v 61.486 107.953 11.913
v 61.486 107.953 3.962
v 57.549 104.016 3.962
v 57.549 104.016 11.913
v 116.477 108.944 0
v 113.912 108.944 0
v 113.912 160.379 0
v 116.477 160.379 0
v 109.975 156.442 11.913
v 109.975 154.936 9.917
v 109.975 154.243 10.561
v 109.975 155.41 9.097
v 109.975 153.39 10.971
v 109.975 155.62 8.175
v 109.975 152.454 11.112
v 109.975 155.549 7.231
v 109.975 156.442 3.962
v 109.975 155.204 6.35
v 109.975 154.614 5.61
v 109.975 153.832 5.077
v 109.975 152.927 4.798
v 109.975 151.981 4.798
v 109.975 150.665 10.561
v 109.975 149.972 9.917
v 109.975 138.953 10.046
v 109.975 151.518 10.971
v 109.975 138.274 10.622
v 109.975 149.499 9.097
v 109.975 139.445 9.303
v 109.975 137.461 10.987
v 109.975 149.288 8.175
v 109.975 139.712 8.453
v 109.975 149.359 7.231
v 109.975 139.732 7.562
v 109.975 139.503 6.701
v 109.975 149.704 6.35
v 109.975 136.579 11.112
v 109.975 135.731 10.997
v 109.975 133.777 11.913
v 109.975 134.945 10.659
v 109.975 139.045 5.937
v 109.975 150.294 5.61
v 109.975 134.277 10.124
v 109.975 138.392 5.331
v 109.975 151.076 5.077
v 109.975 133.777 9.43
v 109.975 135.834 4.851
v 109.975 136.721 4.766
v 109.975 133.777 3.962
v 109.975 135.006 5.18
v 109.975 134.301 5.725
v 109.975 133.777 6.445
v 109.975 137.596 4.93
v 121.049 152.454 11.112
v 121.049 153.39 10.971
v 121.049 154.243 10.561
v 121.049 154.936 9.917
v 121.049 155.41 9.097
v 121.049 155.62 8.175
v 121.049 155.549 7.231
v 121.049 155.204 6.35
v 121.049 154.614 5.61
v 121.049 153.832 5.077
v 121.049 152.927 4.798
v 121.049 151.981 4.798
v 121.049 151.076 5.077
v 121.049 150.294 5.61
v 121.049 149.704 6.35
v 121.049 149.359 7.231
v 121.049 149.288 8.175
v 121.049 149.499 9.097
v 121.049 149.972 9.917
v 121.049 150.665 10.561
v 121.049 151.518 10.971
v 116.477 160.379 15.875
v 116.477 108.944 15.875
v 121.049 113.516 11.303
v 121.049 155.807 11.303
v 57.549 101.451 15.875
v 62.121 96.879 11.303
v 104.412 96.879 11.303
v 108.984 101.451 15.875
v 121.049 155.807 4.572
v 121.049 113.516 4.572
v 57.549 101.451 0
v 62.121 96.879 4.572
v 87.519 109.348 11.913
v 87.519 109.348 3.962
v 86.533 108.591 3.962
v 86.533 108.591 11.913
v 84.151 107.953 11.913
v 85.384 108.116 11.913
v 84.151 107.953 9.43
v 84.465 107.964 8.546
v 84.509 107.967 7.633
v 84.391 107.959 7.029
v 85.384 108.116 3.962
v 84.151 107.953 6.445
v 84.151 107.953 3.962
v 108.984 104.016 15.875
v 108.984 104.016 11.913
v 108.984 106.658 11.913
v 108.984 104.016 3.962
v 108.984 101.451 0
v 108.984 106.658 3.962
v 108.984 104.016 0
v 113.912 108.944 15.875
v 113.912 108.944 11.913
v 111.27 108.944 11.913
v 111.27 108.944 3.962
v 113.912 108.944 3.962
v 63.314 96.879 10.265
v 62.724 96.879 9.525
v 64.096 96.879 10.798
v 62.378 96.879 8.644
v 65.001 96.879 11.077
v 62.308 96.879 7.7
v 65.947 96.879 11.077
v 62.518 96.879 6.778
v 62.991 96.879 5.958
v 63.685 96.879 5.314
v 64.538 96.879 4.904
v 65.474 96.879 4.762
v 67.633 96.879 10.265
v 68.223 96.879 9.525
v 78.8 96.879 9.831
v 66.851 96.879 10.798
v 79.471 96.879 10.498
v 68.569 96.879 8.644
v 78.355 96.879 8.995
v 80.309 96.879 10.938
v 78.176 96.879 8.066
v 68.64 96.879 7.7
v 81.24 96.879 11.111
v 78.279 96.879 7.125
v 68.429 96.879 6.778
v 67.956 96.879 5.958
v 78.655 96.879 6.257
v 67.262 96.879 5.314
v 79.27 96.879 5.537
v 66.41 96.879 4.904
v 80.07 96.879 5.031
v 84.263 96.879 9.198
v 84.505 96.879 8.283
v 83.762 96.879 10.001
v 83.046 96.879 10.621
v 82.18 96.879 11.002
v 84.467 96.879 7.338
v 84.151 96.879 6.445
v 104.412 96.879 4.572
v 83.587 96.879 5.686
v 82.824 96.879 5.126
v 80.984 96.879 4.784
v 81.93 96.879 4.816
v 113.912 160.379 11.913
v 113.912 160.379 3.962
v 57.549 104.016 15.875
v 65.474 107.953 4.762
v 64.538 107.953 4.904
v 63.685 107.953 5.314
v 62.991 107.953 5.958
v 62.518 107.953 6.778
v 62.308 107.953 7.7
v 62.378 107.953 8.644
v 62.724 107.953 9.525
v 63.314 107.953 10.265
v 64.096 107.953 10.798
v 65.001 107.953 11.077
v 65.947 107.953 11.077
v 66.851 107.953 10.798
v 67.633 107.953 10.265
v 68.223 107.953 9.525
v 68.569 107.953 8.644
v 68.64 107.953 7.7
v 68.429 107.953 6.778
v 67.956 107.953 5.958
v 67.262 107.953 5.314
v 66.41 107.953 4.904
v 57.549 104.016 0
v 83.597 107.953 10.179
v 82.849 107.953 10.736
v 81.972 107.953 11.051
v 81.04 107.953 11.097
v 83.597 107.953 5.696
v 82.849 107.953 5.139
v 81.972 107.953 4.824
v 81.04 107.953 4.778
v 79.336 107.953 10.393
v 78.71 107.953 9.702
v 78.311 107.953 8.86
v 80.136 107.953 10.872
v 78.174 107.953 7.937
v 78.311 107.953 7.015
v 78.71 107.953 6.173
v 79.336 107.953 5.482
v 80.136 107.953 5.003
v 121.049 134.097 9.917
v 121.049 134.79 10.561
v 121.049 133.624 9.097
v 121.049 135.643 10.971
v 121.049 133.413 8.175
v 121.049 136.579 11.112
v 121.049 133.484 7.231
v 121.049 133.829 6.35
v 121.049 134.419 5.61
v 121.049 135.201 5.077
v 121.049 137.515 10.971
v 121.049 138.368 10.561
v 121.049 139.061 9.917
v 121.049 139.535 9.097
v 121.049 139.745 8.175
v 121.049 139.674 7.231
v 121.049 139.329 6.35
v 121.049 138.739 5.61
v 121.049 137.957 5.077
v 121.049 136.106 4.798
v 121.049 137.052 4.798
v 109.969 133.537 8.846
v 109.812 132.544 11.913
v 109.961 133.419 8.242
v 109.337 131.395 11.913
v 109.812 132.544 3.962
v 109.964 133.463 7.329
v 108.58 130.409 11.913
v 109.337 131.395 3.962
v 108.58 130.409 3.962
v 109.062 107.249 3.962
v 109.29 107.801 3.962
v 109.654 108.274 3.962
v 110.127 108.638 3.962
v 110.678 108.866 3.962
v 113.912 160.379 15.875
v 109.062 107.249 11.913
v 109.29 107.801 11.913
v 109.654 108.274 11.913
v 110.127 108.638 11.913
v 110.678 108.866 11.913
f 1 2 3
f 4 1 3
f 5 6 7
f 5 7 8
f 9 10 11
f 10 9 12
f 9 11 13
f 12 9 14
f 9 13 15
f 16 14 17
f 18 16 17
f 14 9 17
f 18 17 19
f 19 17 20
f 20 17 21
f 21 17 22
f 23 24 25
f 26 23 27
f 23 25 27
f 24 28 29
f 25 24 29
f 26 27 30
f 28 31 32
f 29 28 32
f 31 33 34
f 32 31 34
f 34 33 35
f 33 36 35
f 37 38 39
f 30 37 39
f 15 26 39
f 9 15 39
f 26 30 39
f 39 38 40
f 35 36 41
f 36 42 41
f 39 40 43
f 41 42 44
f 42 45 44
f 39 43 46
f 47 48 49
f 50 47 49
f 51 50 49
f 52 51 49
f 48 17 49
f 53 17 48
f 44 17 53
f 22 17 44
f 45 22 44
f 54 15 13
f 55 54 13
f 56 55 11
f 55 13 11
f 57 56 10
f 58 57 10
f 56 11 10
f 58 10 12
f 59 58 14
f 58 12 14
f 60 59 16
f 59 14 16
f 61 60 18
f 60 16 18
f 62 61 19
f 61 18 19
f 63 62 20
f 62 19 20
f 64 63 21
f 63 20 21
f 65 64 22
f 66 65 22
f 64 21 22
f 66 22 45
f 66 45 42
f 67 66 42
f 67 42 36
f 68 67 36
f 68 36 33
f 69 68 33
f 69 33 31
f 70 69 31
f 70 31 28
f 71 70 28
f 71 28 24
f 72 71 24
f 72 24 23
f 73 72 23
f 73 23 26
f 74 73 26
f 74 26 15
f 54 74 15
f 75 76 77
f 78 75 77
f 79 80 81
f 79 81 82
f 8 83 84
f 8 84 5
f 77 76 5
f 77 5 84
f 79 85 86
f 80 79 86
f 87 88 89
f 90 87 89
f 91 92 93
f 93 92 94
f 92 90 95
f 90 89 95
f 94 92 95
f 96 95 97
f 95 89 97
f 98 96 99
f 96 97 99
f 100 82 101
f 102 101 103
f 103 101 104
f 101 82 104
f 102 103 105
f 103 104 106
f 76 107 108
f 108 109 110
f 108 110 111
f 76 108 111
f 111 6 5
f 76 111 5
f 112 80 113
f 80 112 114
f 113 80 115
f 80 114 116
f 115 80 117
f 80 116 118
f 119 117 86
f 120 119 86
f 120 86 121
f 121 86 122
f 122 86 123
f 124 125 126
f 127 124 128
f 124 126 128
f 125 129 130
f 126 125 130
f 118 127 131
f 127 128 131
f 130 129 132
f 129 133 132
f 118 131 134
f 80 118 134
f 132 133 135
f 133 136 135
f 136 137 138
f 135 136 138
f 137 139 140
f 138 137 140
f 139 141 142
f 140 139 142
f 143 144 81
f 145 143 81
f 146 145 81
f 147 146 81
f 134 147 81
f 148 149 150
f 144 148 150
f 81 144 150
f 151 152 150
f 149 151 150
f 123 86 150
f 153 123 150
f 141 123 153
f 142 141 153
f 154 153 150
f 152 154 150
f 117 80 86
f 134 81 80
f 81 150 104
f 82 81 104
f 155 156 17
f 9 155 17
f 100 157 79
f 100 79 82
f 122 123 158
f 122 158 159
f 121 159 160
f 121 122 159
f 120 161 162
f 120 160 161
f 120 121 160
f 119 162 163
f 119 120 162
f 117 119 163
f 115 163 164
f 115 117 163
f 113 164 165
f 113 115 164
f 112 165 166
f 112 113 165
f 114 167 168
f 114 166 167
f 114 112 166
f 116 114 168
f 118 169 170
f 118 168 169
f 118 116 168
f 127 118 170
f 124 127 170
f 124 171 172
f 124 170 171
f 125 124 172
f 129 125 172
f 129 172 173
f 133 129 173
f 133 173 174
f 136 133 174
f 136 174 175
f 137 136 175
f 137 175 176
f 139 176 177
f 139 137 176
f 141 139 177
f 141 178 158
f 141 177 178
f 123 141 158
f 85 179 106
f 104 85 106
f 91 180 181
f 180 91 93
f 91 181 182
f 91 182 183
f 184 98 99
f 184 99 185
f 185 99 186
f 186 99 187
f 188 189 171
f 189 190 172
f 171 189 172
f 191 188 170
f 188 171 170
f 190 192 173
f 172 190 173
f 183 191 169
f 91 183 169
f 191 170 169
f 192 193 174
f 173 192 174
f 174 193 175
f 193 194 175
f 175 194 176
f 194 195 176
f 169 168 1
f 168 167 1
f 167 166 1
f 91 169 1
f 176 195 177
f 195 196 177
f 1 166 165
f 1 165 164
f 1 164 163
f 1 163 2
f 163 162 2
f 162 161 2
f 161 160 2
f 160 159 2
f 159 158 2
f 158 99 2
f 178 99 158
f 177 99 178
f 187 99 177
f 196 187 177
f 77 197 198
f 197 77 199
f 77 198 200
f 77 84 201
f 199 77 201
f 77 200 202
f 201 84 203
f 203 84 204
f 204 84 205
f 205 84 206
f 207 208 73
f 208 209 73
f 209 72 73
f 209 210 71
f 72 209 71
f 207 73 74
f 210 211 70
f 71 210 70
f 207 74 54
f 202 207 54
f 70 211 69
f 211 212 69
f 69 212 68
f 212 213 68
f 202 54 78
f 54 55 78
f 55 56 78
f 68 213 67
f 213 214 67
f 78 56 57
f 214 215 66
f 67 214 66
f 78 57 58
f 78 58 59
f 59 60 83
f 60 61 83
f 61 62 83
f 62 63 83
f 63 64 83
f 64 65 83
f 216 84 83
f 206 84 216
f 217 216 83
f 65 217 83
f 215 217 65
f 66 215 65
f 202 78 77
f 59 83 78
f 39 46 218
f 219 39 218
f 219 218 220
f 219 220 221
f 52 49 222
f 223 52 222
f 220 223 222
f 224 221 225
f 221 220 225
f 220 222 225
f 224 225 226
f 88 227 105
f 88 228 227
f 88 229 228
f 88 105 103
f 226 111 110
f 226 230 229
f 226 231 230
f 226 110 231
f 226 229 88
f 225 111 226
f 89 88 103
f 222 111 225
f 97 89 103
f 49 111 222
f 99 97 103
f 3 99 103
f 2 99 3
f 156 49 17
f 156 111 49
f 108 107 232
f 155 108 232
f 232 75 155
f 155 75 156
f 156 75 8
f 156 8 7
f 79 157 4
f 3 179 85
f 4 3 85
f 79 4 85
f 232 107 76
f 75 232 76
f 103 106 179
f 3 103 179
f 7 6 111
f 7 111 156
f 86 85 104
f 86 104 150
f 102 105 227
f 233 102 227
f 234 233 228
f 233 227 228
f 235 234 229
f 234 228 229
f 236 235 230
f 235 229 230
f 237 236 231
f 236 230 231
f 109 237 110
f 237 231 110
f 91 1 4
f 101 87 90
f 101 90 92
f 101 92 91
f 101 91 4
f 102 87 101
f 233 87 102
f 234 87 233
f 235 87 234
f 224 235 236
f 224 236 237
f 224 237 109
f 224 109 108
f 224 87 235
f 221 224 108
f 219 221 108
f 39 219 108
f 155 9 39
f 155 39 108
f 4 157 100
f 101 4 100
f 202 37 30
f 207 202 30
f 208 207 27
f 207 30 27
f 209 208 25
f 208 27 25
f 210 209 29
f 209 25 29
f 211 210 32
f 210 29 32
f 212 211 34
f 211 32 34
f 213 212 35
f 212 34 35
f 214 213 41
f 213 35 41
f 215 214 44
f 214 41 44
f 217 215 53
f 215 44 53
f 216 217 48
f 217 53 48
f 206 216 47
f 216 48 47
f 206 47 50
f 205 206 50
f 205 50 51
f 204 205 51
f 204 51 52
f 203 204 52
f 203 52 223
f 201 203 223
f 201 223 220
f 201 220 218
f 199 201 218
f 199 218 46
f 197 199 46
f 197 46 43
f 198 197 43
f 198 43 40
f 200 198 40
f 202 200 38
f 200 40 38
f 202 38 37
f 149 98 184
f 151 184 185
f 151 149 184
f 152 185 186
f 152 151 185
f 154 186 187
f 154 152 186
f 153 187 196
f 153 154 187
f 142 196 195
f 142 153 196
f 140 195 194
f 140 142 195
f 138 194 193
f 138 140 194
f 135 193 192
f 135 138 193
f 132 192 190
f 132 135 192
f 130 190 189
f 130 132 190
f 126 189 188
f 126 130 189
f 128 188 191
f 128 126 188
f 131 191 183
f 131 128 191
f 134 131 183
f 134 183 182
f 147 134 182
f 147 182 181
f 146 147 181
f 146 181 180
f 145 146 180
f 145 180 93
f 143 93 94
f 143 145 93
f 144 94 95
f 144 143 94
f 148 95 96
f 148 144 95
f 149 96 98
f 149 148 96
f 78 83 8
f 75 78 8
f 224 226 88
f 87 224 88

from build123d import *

# Parameters (mm, degrees)
EXTRUDE1_DEPTH          = 15.875
SKETCH2_W               = 56.3626
SKETCH2_H               = 56.3626
CUT_EXTRUDE1_DEPTH      = 3.9624
SKETCH3_W               = 56.3626
SKETCH3_H               = 56.3626
CUT_EXTRUDE2_DEPTH      = 3.9624
CUT_EXTRUDE3_DEPTH      = 174.221342401
CUT_EXTRUDE4_DEPTH      = 138.612224622
SKETCH7_R               = 3.175
CUT_EXTRUDE6_DEPTH      = 174.221342401
CUT_EXTRUDE7_DEPTH      = 3.9624
CUT_EXTRUDE7_DEPTH_BACK = 133.865789145
SKETCH9_R               = 3.175


with BuildPart() as part:
    # Sketch1 → Extrude1 (new body)
    with BuildSketch(Plane.XY):
        with BuildLine():
            Line((108.579689187, 130.408922074), (87.518897096, 109.348129983))
            ThreePointArc((87.518897096, 109.348129983), (85.973830897, 108.315749755), (84.15130105, 107.953226029))
            Line((84.15130105, 107.953226029), (61.485993141, 107.953226029))
            Line((61.485993141, 107.953226029), (57.548993141, 104.016226029))
            Line((57.548993141, 104.016226029), (57.548993141, 101.450826029))
            Line((57.548993141, 101.450826029), (62.120993141, 96.878826029))
            Line((62.120993141, 96.878826029), (104.411993141, 96.878826029))
            Line((104.411993141, 96.878826029), (108.983993141, 101.450826029))
            Line((108.983993141, 101.450826029), (108.983993141, 106.657826029))
            ThreePointArc((108.983993141, 106.657826029), (109.653547039, 108.27427213), (111.269993141, 108.943826029))
            Line((111.269993141, 108.943826029), (116.476993141, 108.943826029))
            Line((116.476993141, 108.943826029), (121.048993141, 113.515826029))
            Line((121.048993141, 113.515826029), (121.048993141, 155.806826029))
            Line((121.048993141, 155.806826029), (116.476993141, 160.378826029))
            Line((116.476993141, 160.378826029), (113.911593141, 160.378826029))
            Line((113.911593141, 160.378826029), (109.974593141, 156.441826029))
            Line((109.974593141, 156.441826029), (109.974593141, 133.776518119))
            ThreePointArc((109.974593141, 133.776518119), (109.612069415, 131.953988273), (108.579689187, 130.408922074))
        make_face()
    extrude(amount=EXTRUDE1_DEPTH)

    # Sketch2 → Cut-Extrude1 (cut)
    with BuildSketch(Plane.XY.offset(15.875)):
        with Locations((85.730293141, 132.197526029)):
            Rectangle(SKETCH2_W, SKETCH2_H)
    extrude(amount=-CUT_EXTRUDE1_DEPTH, mode=Mode.SUBTRACT)

    # Sketch3 → Cut-Extrude2 (cut)
    with BuildSketch(Plane(origin=(0, 0, 0), x_dir=(-1, 0, 0), z_dir=(0, 0, -1))):
        with Locations((-85.730293141, 132.197526029)):
            Rectangle(SKETCH3_W, SKETCH3_H)
    extrude(amount=-CUT_EXTRUDE2_DEPTH, mode=Mode.SUBTRACT)

    # Sketch4 → Cut-Extrude3 (cut, through all)
    with BuildSketch(Plane.ZY.offset(-57.548993141)):
        Polygon((0, 101.450826029), (4.572, 96.878826029), (11.303, 96.878826029), (15.875, 101.450826029), (19.712057388, 96.14079716), (9.313004955, 92.313845979), (-3.516713195, 97.866362975), align=None)
    extrude(amount=-CUT_EXTRUDE3_DEPTH, mode=Mode.SUBTRACT)

    # Sketch6 → Cut-Extrude4 (cut, through all)
    with BuildSketch(Plane(origin=(0, 160.378826029, 0), x_dir=(1, 0, 0), z_dir=(0, 1, 0))):
        Polygon((116.476993141, -15.875), (121.048993141, -11.303), (121.048993141, -4.572), (116.476993141, 0), (122.85176925, 1.025817626), (123.595758284, -16.192214298), (117.254137473, -18.459609448), align=None)
    extrude(amount=-CUT_EXTRUDE4_DEPTH, mode=Mode.SUBTRACT)

    # Sketch7 → Cut-Extrude6 (cut, through all)
    with BuildSketch(Plane.ZY.offset(-57.548993141)):
        with Locations((7.9375, 136.579026029)):
            Circle(SKETCH7_R)
        with Locations((7.9375, 152.454026029)):
            Circle(SKETCH7_R)
    extrude(amount=-CUT_EXTRUDE6_DEPTH, mode=Mode.SUBTRACT)

    # Sketch9 → Cut-Extrude7 (cut, two sides: drawn at the far end of the back side and taken through both)
    with BuildSketch(Plane(origin=(0, 107.953226029, 0), x_dir=(1, 0, 0), z_dir=(0, 1, 0)).offset(-CUT_EXTRUDE7_DEPTH_BACK)):
        with Locations(Location((65.473793141, -7.9375, 0), (0, 0, 90))):
            Circle(SKETCH9_R)
        with Locations(Location((81.348793141, -7.9375, 0), (0, 0, 28.032682271))):
            Circle(SKETCH9_R)
    extrude(amount=CUT_EXTRUDE7_DEPTH + CUT_EXTRUDE7_DEPTH_BACK, mode=Mode.SUBTRACT)


solid = part.part
